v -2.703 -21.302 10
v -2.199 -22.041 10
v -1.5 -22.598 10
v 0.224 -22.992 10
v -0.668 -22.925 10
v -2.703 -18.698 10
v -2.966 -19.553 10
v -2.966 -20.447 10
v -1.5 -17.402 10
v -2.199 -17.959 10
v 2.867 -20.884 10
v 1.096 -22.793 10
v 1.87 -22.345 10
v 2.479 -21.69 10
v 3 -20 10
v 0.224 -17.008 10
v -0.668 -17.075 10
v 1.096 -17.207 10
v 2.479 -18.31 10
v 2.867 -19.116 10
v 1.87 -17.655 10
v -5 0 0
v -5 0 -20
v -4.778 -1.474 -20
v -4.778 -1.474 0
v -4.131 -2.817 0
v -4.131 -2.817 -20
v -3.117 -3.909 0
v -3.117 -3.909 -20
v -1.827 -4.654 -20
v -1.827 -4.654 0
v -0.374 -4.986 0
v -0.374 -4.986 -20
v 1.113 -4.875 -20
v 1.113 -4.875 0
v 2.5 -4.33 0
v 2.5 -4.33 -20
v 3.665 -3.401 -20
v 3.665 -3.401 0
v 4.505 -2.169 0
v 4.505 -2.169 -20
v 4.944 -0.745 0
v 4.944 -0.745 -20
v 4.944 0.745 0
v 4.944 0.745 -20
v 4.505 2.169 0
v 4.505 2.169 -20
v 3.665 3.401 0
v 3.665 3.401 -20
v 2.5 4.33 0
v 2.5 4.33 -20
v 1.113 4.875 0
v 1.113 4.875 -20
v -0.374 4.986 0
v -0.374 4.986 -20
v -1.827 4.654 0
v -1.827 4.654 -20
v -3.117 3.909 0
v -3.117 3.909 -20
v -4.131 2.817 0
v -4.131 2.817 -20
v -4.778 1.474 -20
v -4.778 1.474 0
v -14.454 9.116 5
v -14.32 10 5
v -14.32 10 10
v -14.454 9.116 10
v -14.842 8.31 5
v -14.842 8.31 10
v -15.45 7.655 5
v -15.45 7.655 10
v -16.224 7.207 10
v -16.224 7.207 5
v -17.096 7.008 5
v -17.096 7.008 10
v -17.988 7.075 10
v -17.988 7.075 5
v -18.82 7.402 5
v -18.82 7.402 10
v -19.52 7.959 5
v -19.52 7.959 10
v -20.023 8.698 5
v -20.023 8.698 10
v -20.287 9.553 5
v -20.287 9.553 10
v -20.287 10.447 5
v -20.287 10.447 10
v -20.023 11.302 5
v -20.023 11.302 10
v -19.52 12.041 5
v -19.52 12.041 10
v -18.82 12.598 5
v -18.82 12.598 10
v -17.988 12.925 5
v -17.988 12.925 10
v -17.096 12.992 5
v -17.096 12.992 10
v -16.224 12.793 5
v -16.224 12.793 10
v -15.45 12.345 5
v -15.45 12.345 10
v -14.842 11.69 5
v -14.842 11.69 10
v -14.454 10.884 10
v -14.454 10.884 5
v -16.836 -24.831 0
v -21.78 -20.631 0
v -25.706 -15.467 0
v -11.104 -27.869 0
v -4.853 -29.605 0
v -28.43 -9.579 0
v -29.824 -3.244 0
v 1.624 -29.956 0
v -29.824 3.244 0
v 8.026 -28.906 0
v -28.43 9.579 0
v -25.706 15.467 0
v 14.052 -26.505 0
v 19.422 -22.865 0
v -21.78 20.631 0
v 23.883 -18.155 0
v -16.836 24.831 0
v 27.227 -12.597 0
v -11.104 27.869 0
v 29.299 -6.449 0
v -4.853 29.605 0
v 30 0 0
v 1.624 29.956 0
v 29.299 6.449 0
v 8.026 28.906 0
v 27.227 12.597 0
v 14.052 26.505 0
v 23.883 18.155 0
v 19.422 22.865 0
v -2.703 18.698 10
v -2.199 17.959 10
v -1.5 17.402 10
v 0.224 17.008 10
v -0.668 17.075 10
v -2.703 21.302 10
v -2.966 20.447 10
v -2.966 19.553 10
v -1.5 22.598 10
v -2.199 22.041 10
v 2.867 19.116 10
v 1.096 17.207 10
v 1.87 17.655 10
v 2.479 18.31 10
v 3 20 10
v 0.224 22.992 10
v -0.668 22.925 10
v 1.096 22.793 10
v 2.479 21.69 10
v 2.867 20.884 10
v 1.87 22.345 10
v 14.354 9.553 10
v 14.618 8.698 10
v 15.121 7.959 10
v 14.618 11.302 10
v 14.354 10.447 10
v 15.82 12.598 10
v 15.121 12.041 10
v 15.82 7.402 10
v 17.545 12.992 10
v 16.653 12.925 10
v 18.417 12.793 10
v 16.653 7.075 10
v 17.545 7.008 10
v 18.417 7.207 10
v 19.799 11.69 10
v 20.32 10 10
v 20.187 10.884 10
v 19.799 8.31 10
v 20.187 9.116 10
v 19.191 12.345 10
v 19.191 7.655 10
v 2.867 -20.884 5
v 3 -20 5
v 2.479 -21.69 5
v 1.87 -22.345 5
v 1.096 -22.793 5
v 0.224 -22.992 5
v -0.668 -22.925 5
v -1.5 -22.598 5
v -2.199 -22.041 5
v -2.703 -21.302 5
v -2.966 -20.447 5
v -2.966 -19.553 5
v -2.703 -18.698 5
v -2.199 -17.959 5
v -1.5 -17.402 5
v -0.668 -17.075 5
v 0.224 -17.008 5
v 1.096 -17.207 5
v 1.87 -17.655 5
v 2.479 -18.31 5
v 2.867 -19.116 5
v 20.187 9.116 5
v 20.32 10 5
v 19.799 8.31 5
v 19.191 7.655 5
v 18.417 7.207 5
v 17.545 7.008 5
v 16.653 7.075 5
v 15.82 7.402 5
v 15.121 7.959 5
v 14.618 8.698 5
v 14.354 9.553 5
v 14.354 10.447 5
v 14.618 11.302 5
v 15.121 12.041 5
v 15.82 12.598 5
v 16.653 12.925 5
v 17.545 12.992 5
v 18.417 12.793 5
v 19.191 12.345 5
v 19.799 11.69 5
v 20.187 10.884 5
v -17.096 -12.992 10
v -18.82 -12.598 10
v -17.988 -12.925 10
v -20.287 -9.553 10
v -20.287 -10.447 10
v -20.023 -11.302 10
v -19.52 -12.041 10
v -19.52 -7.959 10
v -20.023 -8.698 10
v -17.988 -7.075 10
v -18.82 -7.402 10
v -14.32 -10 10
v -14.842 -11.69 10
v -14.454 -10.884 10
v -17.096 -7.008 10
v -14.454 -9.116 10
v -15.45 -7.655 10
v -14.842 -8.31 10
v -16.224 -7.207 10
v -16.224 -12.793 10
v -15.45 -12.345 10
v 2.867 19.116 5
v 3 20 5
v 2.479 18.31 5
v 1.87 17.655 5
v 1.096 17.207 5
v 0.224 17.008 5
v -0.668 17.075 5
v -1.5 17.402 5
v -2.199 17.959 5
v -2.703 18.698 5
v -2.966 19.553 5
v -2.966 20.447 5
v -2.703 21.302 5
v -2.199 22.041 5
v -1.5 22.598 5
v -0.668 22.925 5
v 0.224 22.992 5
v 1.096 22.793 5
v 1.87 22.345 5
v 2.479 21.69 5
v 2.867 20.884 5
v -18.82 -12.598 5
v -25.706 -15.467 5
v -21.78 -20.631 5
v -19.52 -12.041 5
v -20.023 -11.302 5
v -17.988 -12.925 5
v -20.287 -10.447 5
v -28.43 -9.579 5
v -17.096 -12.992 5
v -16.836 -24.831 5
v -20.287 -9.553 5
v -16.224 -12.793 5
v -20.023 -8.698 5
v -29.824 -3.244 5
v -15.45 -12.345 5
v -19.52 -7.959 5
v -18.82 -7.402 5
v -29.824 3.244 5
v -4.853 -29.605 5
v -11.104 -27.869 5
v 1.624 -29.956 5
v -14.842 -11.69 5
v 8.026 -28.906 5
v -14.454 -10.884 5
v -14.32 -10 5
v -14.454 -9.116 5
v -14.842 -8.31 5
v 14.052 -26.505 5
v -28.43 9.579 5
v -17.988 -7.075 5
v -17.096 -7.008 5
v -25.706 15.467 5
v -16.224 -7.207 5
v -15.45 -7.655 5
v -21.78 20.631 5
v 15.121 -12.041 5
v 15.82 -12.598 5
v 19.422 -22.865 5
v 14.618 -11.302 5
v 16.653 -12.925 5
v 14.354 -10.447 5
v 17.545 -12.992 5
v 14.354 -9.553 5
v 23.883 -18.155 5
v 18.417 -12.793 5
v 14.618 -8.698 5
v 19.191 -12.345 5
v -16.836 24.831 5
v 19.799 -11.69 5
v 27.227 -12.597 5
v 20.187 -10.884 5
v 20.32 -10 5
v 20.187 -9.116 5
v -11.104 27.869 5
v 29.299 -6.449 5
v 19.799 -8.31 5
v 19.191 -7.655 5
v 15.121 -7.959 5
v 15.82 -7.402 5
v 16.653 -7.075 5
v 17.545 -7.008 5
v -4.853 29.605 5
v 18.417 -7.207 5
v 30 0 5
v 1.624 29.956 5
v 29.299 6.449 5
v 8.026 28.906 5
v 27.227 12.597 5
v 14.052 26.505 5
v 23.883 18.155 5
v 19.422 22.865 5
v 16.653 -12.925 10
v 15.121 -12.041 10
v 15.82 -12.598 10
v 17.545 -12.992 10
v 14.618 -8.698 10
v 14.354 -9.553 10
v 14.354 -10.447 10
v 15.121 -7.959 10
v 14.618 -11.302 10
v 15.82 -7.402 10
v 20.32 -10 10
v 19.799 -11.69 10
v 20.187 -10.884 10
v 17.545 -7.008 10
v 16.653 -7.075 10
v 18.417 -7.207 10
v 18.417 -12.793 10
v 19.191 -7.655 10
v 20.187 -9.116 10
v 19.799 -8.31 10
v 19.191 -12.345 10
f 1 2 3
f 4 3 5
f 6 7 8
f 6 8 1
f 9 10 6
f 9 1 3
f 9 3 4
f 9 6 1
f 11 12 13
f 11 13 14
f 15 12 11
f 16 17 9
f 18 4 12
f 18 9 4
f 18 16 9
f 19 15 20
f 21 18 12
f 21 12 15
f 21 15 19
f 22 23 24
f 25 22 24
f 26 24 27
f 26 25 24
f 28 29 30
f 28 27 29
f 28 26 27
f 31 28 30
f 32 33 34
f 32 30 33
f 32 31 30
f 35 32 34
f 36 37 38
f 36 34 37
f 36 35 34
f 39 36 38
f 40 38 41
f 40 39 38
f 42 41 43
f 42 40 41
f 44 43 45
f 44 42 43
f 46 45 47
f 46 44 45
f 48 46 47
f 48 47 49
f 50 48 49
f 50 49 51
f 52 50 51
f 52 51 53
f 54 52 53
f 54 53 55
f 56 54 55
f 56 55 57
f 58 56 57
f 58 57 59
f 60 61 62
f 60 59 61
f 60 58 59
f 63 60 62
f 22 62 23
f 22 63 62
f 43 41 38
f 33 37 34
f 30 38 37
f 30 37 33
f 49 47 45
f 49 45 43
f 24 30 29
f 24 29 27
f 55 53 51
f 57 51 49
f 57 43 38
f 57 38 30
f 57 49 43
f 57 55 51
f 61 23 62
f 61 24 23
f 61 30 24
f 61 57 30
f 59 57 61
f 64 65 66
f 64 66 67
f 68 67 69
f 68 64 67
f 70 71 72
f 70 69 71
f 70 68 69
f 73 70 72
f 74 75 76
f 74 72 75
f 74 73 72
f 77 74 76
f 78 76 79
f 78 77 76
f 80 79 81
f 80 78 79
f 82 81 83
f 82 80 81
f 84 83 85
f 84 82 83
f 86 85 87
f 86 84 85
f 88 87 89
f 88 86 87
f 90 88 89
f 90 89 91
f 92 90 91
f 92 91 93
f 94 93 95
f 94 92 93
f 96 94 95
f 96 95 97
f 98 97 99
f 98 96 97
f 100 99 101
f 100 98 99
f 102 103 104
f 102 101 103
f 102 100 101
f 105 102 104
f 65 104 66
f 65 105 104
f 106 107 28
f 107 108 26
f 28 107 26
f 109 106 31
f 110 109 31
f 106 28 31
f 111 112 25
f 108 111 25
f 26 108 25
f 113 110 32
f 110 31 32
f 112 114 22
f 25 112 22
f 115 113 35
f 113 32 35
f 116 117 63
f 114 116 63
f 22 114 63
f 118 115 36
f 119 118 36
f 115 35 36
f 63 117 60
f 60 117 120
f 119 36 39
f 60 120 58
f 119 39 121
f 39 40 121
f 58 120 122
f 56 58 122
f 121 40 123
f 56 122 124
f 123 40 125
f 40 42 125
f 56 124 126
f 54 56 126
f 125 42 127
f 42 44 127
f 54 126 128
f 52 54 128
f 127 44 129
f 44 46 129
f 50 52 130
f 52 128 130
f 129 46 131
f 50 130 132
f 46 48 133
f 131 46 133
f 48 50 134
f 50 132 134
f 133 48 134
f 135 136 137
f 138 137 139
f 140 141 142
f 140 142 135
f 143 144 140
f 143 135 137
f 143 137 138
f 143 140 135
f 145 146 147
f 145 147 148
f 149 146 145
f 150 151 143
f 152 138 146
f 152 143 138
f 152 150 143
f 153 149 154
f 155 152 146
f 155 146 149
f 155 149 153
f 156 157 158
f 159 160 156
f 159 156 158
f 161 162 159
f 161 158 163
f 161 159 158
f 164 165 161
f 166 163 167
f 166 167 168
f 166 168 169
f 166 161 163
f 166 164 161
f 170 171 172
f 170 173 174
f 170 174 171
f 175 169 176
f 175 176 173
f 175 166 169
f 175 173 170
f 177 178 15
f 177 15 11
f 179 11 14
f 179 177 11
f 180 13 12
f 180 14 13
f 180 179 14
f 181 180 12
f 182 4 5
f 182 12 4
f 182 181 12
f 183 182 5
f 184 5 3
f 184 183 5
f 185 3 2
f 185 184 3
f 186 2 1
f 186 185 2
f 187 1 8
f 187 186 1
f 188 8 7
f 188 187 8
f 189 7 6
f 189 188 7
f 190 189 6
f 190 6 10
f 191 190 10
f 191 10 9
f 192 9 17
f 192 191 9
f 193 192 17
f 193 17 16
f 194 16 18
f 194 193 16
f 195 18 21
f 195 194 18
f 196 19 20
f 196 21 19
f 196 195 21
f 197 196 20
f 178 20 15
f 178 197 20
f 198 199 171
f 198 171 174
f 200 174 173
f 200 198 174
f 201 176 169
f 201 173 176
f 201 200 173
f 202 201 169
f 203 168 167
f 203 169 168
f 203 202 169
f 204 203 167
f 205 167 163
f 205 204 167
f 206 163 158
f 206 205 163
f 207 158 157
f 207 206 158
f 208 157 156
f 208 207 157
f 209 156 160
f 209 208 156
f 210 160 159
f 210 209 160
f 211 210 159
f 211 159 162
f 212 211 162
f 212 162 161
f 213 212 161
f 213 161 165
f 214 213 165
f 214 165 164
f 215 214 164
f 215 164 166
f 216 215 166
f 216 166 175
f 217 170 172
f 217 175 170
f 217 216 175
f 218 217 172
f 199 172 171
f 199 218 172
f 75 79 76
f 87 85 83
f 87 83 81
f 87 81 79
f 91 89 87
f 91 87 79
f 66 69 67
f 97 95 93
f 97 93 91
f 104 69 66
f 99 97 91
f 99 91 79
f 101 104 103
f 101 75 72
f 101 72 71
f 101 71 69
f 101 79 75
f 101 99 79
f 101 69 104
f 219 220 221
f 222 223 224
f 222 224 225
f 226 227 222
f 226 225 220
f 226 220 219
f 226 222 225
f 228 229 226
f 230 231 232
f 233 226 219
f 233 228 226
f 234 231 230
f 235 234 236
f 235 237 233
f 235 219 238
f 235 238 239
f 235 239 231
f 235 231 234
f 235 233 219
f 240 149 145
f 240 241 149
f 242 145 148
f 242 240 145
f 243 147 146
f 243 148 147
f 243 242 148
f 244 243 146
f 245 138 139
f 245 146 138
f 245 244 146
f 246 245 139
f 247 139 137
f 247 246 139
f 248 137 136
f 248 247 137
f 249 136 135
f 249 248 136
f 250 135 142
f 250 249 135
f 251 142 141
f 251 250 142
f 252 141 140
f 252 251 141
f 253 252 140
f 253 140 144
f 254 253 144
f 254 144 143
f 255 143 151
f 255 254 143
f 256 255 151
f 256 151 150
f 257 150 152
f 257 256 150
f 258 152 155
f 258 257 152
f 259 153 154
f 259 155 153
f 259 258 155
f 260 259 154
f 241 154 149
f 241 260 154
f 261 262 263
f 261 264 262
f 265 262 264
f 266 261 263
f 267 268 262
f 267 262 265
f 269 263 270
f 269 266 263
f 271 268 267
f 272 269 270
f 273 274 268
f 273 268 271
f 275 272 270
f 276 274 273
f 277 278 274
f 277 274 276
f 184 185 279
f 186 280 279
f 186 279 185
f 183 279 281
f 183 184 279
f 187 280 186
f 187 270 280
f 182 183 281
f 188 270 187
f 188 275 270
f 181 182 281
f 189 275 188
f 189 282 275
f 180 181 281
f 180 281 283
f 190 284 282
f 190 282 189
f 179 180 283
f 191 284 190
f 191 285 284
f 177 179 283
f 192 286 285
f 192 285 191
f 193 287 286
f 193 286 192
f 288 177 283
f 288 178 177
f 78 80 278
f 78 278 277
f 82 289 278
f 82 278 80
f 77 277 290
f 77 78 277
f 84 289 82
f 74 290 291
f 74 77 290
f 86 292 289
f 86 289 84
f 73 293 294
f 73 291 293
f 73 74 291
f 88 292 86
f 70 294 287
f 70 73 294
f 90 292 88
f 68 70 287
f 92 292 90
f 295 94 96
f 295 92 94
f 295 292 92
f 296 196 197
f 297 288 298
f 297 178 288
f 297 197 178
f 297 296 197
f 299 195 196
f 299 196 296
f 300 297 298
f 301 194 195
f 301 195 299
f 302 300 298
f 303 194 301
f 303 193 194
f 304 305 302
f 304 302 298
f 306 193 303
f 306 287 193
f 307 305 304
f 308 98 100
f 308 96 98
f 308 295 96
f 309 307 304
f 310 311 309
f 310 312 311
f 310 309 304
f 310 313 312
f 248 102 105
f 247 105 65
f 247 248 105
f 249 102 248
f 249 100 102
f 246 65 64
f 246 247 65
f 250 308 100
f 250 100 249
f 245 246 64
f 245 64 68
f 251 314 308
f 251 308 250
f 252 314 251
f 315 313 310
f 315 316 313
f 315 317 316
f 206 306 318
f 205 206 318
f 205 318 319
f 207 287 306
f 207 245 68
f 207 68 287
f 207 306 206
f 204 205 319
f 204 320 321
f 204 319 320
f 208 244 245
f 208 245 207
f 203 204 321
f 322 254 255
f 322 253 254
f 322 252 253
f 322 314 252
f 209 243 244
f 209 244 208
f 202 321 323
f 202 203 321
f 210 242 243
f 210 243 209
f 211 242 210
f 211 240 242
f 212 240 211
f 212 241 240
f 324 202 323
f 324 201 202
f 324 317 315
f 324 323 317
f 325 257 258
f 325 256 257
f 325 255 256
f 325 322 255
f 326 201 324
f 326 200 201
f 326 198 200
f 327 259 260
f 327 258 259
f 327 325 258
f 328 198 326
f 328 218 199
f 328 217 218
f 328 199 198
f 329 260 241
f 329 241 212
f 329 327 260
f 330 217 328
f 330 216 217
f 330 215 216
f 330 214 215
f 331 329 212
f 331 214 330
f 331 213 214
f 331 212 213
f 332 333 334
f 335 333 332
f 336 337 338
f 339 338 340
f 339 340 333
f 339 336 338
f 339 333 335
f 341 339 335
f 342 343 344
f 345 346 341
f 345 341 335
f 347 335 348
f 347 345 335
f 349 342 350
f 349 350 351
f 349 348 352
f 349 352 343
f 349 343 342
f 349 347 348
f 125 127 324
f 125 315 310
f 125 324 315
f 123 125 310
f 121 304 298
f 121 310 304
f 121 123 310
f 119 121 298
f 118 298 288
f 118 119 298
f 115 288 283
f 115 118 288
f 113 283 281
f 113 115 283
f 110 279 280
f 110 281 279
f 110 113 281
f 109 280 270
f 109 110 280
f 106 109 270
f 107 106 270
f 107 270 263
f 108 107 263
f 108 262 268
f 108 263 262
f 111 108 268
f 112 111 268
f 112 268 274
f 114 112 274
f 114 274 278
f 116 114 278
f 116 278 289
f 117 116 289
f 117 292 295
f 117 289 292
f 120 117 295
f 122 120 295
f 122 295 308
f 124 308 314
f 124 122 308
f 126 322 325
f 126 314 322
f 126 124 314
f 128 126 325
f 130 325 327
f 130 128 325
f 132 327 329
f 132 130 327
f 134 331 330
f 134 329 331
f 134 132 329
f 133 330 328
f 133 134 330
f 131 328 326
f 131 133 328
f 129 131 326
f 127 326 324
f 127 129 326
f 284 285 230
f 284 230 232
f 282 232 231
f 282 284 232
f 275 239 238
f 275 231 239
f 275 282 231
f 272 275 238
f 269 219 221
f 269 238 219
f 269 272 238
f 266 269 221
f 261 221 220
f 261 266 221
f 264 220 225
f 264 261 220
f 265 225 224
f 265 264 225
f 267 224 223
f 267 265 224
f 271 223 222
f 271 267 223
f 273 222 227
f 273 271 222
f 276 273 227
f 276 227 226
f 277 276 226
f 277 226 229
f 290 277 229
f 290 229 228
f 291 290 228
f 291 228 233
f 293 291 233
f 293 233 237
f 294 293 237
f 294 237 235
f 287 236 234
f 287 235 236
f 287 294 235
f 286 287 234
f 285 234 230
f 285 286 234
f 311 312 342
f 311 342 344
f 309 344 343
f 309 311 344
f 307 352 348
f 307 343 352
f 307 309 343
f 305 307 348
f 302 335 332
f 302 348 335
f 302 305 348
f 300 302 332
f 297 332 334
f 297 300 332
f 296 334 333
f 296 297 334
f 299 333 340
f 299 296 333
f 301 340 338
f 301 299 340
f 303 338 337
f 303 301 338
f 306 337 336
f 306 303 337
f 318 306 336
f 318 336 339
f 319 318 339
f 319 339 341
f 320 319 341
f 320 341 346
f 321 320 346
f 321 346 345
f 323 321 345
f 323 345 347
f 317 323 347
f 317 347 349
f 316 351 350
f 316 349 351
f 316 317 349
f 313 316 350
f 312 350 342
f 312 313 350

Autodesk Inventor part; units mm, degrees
ref_plane "YZ Plane" through (0, 0, 0) normal (1, 0, 0) x (0, 1, 0)
ref_plane "XZ Plane" through (0, 0, 0) normal (0, 1, 0) x (-1, 0, 0)
ref_plane "XY Plane" through (0, 0, 0) normal (0, 0, 1) x (1, 0, 0)
sketch "草圖1" plane through (0, 0, 0) normal (0, 0, 1) x (1, 0, 0)
  circle A0 centre (0, 0) radius 30
  dimension "d0" = 60
extrude "擠出1" add sketch "草圖1" along normal blind 5
sketch "草圖2" plane through (0, 0, 5) normal (0, 0, 1) x (1, 0, 0)
  circle A0 centre (0, 20) radius 3
  circle A1 centre (-17.3205, 10) radius 3
  circle A2 centre (-17.3205, -10) radius 3
  circle A3 centre (0, -20) radius 3
  circle A4 centre (17.3205, -10) radius 3
  circle A5 centre (17.3205, 10) radius 3
  point P0 (0, 0)
  dimension "d4" = 6
  dimension "d5" = 20
  dimension "d8" = 360
extrude "擠出2" add sketch "草圖2" along normal blind 5
sketch "草圖3" plane through (0, 0, 0) normal (0, 0, -1) x (-1, 0, 0)
  circle A0 centre (0, 0) radius 5
  dimension "d12" = 10
extrude "擠出3" add sketch "草圖3" along normal blind 20
properties part number "Output_Shaft"
